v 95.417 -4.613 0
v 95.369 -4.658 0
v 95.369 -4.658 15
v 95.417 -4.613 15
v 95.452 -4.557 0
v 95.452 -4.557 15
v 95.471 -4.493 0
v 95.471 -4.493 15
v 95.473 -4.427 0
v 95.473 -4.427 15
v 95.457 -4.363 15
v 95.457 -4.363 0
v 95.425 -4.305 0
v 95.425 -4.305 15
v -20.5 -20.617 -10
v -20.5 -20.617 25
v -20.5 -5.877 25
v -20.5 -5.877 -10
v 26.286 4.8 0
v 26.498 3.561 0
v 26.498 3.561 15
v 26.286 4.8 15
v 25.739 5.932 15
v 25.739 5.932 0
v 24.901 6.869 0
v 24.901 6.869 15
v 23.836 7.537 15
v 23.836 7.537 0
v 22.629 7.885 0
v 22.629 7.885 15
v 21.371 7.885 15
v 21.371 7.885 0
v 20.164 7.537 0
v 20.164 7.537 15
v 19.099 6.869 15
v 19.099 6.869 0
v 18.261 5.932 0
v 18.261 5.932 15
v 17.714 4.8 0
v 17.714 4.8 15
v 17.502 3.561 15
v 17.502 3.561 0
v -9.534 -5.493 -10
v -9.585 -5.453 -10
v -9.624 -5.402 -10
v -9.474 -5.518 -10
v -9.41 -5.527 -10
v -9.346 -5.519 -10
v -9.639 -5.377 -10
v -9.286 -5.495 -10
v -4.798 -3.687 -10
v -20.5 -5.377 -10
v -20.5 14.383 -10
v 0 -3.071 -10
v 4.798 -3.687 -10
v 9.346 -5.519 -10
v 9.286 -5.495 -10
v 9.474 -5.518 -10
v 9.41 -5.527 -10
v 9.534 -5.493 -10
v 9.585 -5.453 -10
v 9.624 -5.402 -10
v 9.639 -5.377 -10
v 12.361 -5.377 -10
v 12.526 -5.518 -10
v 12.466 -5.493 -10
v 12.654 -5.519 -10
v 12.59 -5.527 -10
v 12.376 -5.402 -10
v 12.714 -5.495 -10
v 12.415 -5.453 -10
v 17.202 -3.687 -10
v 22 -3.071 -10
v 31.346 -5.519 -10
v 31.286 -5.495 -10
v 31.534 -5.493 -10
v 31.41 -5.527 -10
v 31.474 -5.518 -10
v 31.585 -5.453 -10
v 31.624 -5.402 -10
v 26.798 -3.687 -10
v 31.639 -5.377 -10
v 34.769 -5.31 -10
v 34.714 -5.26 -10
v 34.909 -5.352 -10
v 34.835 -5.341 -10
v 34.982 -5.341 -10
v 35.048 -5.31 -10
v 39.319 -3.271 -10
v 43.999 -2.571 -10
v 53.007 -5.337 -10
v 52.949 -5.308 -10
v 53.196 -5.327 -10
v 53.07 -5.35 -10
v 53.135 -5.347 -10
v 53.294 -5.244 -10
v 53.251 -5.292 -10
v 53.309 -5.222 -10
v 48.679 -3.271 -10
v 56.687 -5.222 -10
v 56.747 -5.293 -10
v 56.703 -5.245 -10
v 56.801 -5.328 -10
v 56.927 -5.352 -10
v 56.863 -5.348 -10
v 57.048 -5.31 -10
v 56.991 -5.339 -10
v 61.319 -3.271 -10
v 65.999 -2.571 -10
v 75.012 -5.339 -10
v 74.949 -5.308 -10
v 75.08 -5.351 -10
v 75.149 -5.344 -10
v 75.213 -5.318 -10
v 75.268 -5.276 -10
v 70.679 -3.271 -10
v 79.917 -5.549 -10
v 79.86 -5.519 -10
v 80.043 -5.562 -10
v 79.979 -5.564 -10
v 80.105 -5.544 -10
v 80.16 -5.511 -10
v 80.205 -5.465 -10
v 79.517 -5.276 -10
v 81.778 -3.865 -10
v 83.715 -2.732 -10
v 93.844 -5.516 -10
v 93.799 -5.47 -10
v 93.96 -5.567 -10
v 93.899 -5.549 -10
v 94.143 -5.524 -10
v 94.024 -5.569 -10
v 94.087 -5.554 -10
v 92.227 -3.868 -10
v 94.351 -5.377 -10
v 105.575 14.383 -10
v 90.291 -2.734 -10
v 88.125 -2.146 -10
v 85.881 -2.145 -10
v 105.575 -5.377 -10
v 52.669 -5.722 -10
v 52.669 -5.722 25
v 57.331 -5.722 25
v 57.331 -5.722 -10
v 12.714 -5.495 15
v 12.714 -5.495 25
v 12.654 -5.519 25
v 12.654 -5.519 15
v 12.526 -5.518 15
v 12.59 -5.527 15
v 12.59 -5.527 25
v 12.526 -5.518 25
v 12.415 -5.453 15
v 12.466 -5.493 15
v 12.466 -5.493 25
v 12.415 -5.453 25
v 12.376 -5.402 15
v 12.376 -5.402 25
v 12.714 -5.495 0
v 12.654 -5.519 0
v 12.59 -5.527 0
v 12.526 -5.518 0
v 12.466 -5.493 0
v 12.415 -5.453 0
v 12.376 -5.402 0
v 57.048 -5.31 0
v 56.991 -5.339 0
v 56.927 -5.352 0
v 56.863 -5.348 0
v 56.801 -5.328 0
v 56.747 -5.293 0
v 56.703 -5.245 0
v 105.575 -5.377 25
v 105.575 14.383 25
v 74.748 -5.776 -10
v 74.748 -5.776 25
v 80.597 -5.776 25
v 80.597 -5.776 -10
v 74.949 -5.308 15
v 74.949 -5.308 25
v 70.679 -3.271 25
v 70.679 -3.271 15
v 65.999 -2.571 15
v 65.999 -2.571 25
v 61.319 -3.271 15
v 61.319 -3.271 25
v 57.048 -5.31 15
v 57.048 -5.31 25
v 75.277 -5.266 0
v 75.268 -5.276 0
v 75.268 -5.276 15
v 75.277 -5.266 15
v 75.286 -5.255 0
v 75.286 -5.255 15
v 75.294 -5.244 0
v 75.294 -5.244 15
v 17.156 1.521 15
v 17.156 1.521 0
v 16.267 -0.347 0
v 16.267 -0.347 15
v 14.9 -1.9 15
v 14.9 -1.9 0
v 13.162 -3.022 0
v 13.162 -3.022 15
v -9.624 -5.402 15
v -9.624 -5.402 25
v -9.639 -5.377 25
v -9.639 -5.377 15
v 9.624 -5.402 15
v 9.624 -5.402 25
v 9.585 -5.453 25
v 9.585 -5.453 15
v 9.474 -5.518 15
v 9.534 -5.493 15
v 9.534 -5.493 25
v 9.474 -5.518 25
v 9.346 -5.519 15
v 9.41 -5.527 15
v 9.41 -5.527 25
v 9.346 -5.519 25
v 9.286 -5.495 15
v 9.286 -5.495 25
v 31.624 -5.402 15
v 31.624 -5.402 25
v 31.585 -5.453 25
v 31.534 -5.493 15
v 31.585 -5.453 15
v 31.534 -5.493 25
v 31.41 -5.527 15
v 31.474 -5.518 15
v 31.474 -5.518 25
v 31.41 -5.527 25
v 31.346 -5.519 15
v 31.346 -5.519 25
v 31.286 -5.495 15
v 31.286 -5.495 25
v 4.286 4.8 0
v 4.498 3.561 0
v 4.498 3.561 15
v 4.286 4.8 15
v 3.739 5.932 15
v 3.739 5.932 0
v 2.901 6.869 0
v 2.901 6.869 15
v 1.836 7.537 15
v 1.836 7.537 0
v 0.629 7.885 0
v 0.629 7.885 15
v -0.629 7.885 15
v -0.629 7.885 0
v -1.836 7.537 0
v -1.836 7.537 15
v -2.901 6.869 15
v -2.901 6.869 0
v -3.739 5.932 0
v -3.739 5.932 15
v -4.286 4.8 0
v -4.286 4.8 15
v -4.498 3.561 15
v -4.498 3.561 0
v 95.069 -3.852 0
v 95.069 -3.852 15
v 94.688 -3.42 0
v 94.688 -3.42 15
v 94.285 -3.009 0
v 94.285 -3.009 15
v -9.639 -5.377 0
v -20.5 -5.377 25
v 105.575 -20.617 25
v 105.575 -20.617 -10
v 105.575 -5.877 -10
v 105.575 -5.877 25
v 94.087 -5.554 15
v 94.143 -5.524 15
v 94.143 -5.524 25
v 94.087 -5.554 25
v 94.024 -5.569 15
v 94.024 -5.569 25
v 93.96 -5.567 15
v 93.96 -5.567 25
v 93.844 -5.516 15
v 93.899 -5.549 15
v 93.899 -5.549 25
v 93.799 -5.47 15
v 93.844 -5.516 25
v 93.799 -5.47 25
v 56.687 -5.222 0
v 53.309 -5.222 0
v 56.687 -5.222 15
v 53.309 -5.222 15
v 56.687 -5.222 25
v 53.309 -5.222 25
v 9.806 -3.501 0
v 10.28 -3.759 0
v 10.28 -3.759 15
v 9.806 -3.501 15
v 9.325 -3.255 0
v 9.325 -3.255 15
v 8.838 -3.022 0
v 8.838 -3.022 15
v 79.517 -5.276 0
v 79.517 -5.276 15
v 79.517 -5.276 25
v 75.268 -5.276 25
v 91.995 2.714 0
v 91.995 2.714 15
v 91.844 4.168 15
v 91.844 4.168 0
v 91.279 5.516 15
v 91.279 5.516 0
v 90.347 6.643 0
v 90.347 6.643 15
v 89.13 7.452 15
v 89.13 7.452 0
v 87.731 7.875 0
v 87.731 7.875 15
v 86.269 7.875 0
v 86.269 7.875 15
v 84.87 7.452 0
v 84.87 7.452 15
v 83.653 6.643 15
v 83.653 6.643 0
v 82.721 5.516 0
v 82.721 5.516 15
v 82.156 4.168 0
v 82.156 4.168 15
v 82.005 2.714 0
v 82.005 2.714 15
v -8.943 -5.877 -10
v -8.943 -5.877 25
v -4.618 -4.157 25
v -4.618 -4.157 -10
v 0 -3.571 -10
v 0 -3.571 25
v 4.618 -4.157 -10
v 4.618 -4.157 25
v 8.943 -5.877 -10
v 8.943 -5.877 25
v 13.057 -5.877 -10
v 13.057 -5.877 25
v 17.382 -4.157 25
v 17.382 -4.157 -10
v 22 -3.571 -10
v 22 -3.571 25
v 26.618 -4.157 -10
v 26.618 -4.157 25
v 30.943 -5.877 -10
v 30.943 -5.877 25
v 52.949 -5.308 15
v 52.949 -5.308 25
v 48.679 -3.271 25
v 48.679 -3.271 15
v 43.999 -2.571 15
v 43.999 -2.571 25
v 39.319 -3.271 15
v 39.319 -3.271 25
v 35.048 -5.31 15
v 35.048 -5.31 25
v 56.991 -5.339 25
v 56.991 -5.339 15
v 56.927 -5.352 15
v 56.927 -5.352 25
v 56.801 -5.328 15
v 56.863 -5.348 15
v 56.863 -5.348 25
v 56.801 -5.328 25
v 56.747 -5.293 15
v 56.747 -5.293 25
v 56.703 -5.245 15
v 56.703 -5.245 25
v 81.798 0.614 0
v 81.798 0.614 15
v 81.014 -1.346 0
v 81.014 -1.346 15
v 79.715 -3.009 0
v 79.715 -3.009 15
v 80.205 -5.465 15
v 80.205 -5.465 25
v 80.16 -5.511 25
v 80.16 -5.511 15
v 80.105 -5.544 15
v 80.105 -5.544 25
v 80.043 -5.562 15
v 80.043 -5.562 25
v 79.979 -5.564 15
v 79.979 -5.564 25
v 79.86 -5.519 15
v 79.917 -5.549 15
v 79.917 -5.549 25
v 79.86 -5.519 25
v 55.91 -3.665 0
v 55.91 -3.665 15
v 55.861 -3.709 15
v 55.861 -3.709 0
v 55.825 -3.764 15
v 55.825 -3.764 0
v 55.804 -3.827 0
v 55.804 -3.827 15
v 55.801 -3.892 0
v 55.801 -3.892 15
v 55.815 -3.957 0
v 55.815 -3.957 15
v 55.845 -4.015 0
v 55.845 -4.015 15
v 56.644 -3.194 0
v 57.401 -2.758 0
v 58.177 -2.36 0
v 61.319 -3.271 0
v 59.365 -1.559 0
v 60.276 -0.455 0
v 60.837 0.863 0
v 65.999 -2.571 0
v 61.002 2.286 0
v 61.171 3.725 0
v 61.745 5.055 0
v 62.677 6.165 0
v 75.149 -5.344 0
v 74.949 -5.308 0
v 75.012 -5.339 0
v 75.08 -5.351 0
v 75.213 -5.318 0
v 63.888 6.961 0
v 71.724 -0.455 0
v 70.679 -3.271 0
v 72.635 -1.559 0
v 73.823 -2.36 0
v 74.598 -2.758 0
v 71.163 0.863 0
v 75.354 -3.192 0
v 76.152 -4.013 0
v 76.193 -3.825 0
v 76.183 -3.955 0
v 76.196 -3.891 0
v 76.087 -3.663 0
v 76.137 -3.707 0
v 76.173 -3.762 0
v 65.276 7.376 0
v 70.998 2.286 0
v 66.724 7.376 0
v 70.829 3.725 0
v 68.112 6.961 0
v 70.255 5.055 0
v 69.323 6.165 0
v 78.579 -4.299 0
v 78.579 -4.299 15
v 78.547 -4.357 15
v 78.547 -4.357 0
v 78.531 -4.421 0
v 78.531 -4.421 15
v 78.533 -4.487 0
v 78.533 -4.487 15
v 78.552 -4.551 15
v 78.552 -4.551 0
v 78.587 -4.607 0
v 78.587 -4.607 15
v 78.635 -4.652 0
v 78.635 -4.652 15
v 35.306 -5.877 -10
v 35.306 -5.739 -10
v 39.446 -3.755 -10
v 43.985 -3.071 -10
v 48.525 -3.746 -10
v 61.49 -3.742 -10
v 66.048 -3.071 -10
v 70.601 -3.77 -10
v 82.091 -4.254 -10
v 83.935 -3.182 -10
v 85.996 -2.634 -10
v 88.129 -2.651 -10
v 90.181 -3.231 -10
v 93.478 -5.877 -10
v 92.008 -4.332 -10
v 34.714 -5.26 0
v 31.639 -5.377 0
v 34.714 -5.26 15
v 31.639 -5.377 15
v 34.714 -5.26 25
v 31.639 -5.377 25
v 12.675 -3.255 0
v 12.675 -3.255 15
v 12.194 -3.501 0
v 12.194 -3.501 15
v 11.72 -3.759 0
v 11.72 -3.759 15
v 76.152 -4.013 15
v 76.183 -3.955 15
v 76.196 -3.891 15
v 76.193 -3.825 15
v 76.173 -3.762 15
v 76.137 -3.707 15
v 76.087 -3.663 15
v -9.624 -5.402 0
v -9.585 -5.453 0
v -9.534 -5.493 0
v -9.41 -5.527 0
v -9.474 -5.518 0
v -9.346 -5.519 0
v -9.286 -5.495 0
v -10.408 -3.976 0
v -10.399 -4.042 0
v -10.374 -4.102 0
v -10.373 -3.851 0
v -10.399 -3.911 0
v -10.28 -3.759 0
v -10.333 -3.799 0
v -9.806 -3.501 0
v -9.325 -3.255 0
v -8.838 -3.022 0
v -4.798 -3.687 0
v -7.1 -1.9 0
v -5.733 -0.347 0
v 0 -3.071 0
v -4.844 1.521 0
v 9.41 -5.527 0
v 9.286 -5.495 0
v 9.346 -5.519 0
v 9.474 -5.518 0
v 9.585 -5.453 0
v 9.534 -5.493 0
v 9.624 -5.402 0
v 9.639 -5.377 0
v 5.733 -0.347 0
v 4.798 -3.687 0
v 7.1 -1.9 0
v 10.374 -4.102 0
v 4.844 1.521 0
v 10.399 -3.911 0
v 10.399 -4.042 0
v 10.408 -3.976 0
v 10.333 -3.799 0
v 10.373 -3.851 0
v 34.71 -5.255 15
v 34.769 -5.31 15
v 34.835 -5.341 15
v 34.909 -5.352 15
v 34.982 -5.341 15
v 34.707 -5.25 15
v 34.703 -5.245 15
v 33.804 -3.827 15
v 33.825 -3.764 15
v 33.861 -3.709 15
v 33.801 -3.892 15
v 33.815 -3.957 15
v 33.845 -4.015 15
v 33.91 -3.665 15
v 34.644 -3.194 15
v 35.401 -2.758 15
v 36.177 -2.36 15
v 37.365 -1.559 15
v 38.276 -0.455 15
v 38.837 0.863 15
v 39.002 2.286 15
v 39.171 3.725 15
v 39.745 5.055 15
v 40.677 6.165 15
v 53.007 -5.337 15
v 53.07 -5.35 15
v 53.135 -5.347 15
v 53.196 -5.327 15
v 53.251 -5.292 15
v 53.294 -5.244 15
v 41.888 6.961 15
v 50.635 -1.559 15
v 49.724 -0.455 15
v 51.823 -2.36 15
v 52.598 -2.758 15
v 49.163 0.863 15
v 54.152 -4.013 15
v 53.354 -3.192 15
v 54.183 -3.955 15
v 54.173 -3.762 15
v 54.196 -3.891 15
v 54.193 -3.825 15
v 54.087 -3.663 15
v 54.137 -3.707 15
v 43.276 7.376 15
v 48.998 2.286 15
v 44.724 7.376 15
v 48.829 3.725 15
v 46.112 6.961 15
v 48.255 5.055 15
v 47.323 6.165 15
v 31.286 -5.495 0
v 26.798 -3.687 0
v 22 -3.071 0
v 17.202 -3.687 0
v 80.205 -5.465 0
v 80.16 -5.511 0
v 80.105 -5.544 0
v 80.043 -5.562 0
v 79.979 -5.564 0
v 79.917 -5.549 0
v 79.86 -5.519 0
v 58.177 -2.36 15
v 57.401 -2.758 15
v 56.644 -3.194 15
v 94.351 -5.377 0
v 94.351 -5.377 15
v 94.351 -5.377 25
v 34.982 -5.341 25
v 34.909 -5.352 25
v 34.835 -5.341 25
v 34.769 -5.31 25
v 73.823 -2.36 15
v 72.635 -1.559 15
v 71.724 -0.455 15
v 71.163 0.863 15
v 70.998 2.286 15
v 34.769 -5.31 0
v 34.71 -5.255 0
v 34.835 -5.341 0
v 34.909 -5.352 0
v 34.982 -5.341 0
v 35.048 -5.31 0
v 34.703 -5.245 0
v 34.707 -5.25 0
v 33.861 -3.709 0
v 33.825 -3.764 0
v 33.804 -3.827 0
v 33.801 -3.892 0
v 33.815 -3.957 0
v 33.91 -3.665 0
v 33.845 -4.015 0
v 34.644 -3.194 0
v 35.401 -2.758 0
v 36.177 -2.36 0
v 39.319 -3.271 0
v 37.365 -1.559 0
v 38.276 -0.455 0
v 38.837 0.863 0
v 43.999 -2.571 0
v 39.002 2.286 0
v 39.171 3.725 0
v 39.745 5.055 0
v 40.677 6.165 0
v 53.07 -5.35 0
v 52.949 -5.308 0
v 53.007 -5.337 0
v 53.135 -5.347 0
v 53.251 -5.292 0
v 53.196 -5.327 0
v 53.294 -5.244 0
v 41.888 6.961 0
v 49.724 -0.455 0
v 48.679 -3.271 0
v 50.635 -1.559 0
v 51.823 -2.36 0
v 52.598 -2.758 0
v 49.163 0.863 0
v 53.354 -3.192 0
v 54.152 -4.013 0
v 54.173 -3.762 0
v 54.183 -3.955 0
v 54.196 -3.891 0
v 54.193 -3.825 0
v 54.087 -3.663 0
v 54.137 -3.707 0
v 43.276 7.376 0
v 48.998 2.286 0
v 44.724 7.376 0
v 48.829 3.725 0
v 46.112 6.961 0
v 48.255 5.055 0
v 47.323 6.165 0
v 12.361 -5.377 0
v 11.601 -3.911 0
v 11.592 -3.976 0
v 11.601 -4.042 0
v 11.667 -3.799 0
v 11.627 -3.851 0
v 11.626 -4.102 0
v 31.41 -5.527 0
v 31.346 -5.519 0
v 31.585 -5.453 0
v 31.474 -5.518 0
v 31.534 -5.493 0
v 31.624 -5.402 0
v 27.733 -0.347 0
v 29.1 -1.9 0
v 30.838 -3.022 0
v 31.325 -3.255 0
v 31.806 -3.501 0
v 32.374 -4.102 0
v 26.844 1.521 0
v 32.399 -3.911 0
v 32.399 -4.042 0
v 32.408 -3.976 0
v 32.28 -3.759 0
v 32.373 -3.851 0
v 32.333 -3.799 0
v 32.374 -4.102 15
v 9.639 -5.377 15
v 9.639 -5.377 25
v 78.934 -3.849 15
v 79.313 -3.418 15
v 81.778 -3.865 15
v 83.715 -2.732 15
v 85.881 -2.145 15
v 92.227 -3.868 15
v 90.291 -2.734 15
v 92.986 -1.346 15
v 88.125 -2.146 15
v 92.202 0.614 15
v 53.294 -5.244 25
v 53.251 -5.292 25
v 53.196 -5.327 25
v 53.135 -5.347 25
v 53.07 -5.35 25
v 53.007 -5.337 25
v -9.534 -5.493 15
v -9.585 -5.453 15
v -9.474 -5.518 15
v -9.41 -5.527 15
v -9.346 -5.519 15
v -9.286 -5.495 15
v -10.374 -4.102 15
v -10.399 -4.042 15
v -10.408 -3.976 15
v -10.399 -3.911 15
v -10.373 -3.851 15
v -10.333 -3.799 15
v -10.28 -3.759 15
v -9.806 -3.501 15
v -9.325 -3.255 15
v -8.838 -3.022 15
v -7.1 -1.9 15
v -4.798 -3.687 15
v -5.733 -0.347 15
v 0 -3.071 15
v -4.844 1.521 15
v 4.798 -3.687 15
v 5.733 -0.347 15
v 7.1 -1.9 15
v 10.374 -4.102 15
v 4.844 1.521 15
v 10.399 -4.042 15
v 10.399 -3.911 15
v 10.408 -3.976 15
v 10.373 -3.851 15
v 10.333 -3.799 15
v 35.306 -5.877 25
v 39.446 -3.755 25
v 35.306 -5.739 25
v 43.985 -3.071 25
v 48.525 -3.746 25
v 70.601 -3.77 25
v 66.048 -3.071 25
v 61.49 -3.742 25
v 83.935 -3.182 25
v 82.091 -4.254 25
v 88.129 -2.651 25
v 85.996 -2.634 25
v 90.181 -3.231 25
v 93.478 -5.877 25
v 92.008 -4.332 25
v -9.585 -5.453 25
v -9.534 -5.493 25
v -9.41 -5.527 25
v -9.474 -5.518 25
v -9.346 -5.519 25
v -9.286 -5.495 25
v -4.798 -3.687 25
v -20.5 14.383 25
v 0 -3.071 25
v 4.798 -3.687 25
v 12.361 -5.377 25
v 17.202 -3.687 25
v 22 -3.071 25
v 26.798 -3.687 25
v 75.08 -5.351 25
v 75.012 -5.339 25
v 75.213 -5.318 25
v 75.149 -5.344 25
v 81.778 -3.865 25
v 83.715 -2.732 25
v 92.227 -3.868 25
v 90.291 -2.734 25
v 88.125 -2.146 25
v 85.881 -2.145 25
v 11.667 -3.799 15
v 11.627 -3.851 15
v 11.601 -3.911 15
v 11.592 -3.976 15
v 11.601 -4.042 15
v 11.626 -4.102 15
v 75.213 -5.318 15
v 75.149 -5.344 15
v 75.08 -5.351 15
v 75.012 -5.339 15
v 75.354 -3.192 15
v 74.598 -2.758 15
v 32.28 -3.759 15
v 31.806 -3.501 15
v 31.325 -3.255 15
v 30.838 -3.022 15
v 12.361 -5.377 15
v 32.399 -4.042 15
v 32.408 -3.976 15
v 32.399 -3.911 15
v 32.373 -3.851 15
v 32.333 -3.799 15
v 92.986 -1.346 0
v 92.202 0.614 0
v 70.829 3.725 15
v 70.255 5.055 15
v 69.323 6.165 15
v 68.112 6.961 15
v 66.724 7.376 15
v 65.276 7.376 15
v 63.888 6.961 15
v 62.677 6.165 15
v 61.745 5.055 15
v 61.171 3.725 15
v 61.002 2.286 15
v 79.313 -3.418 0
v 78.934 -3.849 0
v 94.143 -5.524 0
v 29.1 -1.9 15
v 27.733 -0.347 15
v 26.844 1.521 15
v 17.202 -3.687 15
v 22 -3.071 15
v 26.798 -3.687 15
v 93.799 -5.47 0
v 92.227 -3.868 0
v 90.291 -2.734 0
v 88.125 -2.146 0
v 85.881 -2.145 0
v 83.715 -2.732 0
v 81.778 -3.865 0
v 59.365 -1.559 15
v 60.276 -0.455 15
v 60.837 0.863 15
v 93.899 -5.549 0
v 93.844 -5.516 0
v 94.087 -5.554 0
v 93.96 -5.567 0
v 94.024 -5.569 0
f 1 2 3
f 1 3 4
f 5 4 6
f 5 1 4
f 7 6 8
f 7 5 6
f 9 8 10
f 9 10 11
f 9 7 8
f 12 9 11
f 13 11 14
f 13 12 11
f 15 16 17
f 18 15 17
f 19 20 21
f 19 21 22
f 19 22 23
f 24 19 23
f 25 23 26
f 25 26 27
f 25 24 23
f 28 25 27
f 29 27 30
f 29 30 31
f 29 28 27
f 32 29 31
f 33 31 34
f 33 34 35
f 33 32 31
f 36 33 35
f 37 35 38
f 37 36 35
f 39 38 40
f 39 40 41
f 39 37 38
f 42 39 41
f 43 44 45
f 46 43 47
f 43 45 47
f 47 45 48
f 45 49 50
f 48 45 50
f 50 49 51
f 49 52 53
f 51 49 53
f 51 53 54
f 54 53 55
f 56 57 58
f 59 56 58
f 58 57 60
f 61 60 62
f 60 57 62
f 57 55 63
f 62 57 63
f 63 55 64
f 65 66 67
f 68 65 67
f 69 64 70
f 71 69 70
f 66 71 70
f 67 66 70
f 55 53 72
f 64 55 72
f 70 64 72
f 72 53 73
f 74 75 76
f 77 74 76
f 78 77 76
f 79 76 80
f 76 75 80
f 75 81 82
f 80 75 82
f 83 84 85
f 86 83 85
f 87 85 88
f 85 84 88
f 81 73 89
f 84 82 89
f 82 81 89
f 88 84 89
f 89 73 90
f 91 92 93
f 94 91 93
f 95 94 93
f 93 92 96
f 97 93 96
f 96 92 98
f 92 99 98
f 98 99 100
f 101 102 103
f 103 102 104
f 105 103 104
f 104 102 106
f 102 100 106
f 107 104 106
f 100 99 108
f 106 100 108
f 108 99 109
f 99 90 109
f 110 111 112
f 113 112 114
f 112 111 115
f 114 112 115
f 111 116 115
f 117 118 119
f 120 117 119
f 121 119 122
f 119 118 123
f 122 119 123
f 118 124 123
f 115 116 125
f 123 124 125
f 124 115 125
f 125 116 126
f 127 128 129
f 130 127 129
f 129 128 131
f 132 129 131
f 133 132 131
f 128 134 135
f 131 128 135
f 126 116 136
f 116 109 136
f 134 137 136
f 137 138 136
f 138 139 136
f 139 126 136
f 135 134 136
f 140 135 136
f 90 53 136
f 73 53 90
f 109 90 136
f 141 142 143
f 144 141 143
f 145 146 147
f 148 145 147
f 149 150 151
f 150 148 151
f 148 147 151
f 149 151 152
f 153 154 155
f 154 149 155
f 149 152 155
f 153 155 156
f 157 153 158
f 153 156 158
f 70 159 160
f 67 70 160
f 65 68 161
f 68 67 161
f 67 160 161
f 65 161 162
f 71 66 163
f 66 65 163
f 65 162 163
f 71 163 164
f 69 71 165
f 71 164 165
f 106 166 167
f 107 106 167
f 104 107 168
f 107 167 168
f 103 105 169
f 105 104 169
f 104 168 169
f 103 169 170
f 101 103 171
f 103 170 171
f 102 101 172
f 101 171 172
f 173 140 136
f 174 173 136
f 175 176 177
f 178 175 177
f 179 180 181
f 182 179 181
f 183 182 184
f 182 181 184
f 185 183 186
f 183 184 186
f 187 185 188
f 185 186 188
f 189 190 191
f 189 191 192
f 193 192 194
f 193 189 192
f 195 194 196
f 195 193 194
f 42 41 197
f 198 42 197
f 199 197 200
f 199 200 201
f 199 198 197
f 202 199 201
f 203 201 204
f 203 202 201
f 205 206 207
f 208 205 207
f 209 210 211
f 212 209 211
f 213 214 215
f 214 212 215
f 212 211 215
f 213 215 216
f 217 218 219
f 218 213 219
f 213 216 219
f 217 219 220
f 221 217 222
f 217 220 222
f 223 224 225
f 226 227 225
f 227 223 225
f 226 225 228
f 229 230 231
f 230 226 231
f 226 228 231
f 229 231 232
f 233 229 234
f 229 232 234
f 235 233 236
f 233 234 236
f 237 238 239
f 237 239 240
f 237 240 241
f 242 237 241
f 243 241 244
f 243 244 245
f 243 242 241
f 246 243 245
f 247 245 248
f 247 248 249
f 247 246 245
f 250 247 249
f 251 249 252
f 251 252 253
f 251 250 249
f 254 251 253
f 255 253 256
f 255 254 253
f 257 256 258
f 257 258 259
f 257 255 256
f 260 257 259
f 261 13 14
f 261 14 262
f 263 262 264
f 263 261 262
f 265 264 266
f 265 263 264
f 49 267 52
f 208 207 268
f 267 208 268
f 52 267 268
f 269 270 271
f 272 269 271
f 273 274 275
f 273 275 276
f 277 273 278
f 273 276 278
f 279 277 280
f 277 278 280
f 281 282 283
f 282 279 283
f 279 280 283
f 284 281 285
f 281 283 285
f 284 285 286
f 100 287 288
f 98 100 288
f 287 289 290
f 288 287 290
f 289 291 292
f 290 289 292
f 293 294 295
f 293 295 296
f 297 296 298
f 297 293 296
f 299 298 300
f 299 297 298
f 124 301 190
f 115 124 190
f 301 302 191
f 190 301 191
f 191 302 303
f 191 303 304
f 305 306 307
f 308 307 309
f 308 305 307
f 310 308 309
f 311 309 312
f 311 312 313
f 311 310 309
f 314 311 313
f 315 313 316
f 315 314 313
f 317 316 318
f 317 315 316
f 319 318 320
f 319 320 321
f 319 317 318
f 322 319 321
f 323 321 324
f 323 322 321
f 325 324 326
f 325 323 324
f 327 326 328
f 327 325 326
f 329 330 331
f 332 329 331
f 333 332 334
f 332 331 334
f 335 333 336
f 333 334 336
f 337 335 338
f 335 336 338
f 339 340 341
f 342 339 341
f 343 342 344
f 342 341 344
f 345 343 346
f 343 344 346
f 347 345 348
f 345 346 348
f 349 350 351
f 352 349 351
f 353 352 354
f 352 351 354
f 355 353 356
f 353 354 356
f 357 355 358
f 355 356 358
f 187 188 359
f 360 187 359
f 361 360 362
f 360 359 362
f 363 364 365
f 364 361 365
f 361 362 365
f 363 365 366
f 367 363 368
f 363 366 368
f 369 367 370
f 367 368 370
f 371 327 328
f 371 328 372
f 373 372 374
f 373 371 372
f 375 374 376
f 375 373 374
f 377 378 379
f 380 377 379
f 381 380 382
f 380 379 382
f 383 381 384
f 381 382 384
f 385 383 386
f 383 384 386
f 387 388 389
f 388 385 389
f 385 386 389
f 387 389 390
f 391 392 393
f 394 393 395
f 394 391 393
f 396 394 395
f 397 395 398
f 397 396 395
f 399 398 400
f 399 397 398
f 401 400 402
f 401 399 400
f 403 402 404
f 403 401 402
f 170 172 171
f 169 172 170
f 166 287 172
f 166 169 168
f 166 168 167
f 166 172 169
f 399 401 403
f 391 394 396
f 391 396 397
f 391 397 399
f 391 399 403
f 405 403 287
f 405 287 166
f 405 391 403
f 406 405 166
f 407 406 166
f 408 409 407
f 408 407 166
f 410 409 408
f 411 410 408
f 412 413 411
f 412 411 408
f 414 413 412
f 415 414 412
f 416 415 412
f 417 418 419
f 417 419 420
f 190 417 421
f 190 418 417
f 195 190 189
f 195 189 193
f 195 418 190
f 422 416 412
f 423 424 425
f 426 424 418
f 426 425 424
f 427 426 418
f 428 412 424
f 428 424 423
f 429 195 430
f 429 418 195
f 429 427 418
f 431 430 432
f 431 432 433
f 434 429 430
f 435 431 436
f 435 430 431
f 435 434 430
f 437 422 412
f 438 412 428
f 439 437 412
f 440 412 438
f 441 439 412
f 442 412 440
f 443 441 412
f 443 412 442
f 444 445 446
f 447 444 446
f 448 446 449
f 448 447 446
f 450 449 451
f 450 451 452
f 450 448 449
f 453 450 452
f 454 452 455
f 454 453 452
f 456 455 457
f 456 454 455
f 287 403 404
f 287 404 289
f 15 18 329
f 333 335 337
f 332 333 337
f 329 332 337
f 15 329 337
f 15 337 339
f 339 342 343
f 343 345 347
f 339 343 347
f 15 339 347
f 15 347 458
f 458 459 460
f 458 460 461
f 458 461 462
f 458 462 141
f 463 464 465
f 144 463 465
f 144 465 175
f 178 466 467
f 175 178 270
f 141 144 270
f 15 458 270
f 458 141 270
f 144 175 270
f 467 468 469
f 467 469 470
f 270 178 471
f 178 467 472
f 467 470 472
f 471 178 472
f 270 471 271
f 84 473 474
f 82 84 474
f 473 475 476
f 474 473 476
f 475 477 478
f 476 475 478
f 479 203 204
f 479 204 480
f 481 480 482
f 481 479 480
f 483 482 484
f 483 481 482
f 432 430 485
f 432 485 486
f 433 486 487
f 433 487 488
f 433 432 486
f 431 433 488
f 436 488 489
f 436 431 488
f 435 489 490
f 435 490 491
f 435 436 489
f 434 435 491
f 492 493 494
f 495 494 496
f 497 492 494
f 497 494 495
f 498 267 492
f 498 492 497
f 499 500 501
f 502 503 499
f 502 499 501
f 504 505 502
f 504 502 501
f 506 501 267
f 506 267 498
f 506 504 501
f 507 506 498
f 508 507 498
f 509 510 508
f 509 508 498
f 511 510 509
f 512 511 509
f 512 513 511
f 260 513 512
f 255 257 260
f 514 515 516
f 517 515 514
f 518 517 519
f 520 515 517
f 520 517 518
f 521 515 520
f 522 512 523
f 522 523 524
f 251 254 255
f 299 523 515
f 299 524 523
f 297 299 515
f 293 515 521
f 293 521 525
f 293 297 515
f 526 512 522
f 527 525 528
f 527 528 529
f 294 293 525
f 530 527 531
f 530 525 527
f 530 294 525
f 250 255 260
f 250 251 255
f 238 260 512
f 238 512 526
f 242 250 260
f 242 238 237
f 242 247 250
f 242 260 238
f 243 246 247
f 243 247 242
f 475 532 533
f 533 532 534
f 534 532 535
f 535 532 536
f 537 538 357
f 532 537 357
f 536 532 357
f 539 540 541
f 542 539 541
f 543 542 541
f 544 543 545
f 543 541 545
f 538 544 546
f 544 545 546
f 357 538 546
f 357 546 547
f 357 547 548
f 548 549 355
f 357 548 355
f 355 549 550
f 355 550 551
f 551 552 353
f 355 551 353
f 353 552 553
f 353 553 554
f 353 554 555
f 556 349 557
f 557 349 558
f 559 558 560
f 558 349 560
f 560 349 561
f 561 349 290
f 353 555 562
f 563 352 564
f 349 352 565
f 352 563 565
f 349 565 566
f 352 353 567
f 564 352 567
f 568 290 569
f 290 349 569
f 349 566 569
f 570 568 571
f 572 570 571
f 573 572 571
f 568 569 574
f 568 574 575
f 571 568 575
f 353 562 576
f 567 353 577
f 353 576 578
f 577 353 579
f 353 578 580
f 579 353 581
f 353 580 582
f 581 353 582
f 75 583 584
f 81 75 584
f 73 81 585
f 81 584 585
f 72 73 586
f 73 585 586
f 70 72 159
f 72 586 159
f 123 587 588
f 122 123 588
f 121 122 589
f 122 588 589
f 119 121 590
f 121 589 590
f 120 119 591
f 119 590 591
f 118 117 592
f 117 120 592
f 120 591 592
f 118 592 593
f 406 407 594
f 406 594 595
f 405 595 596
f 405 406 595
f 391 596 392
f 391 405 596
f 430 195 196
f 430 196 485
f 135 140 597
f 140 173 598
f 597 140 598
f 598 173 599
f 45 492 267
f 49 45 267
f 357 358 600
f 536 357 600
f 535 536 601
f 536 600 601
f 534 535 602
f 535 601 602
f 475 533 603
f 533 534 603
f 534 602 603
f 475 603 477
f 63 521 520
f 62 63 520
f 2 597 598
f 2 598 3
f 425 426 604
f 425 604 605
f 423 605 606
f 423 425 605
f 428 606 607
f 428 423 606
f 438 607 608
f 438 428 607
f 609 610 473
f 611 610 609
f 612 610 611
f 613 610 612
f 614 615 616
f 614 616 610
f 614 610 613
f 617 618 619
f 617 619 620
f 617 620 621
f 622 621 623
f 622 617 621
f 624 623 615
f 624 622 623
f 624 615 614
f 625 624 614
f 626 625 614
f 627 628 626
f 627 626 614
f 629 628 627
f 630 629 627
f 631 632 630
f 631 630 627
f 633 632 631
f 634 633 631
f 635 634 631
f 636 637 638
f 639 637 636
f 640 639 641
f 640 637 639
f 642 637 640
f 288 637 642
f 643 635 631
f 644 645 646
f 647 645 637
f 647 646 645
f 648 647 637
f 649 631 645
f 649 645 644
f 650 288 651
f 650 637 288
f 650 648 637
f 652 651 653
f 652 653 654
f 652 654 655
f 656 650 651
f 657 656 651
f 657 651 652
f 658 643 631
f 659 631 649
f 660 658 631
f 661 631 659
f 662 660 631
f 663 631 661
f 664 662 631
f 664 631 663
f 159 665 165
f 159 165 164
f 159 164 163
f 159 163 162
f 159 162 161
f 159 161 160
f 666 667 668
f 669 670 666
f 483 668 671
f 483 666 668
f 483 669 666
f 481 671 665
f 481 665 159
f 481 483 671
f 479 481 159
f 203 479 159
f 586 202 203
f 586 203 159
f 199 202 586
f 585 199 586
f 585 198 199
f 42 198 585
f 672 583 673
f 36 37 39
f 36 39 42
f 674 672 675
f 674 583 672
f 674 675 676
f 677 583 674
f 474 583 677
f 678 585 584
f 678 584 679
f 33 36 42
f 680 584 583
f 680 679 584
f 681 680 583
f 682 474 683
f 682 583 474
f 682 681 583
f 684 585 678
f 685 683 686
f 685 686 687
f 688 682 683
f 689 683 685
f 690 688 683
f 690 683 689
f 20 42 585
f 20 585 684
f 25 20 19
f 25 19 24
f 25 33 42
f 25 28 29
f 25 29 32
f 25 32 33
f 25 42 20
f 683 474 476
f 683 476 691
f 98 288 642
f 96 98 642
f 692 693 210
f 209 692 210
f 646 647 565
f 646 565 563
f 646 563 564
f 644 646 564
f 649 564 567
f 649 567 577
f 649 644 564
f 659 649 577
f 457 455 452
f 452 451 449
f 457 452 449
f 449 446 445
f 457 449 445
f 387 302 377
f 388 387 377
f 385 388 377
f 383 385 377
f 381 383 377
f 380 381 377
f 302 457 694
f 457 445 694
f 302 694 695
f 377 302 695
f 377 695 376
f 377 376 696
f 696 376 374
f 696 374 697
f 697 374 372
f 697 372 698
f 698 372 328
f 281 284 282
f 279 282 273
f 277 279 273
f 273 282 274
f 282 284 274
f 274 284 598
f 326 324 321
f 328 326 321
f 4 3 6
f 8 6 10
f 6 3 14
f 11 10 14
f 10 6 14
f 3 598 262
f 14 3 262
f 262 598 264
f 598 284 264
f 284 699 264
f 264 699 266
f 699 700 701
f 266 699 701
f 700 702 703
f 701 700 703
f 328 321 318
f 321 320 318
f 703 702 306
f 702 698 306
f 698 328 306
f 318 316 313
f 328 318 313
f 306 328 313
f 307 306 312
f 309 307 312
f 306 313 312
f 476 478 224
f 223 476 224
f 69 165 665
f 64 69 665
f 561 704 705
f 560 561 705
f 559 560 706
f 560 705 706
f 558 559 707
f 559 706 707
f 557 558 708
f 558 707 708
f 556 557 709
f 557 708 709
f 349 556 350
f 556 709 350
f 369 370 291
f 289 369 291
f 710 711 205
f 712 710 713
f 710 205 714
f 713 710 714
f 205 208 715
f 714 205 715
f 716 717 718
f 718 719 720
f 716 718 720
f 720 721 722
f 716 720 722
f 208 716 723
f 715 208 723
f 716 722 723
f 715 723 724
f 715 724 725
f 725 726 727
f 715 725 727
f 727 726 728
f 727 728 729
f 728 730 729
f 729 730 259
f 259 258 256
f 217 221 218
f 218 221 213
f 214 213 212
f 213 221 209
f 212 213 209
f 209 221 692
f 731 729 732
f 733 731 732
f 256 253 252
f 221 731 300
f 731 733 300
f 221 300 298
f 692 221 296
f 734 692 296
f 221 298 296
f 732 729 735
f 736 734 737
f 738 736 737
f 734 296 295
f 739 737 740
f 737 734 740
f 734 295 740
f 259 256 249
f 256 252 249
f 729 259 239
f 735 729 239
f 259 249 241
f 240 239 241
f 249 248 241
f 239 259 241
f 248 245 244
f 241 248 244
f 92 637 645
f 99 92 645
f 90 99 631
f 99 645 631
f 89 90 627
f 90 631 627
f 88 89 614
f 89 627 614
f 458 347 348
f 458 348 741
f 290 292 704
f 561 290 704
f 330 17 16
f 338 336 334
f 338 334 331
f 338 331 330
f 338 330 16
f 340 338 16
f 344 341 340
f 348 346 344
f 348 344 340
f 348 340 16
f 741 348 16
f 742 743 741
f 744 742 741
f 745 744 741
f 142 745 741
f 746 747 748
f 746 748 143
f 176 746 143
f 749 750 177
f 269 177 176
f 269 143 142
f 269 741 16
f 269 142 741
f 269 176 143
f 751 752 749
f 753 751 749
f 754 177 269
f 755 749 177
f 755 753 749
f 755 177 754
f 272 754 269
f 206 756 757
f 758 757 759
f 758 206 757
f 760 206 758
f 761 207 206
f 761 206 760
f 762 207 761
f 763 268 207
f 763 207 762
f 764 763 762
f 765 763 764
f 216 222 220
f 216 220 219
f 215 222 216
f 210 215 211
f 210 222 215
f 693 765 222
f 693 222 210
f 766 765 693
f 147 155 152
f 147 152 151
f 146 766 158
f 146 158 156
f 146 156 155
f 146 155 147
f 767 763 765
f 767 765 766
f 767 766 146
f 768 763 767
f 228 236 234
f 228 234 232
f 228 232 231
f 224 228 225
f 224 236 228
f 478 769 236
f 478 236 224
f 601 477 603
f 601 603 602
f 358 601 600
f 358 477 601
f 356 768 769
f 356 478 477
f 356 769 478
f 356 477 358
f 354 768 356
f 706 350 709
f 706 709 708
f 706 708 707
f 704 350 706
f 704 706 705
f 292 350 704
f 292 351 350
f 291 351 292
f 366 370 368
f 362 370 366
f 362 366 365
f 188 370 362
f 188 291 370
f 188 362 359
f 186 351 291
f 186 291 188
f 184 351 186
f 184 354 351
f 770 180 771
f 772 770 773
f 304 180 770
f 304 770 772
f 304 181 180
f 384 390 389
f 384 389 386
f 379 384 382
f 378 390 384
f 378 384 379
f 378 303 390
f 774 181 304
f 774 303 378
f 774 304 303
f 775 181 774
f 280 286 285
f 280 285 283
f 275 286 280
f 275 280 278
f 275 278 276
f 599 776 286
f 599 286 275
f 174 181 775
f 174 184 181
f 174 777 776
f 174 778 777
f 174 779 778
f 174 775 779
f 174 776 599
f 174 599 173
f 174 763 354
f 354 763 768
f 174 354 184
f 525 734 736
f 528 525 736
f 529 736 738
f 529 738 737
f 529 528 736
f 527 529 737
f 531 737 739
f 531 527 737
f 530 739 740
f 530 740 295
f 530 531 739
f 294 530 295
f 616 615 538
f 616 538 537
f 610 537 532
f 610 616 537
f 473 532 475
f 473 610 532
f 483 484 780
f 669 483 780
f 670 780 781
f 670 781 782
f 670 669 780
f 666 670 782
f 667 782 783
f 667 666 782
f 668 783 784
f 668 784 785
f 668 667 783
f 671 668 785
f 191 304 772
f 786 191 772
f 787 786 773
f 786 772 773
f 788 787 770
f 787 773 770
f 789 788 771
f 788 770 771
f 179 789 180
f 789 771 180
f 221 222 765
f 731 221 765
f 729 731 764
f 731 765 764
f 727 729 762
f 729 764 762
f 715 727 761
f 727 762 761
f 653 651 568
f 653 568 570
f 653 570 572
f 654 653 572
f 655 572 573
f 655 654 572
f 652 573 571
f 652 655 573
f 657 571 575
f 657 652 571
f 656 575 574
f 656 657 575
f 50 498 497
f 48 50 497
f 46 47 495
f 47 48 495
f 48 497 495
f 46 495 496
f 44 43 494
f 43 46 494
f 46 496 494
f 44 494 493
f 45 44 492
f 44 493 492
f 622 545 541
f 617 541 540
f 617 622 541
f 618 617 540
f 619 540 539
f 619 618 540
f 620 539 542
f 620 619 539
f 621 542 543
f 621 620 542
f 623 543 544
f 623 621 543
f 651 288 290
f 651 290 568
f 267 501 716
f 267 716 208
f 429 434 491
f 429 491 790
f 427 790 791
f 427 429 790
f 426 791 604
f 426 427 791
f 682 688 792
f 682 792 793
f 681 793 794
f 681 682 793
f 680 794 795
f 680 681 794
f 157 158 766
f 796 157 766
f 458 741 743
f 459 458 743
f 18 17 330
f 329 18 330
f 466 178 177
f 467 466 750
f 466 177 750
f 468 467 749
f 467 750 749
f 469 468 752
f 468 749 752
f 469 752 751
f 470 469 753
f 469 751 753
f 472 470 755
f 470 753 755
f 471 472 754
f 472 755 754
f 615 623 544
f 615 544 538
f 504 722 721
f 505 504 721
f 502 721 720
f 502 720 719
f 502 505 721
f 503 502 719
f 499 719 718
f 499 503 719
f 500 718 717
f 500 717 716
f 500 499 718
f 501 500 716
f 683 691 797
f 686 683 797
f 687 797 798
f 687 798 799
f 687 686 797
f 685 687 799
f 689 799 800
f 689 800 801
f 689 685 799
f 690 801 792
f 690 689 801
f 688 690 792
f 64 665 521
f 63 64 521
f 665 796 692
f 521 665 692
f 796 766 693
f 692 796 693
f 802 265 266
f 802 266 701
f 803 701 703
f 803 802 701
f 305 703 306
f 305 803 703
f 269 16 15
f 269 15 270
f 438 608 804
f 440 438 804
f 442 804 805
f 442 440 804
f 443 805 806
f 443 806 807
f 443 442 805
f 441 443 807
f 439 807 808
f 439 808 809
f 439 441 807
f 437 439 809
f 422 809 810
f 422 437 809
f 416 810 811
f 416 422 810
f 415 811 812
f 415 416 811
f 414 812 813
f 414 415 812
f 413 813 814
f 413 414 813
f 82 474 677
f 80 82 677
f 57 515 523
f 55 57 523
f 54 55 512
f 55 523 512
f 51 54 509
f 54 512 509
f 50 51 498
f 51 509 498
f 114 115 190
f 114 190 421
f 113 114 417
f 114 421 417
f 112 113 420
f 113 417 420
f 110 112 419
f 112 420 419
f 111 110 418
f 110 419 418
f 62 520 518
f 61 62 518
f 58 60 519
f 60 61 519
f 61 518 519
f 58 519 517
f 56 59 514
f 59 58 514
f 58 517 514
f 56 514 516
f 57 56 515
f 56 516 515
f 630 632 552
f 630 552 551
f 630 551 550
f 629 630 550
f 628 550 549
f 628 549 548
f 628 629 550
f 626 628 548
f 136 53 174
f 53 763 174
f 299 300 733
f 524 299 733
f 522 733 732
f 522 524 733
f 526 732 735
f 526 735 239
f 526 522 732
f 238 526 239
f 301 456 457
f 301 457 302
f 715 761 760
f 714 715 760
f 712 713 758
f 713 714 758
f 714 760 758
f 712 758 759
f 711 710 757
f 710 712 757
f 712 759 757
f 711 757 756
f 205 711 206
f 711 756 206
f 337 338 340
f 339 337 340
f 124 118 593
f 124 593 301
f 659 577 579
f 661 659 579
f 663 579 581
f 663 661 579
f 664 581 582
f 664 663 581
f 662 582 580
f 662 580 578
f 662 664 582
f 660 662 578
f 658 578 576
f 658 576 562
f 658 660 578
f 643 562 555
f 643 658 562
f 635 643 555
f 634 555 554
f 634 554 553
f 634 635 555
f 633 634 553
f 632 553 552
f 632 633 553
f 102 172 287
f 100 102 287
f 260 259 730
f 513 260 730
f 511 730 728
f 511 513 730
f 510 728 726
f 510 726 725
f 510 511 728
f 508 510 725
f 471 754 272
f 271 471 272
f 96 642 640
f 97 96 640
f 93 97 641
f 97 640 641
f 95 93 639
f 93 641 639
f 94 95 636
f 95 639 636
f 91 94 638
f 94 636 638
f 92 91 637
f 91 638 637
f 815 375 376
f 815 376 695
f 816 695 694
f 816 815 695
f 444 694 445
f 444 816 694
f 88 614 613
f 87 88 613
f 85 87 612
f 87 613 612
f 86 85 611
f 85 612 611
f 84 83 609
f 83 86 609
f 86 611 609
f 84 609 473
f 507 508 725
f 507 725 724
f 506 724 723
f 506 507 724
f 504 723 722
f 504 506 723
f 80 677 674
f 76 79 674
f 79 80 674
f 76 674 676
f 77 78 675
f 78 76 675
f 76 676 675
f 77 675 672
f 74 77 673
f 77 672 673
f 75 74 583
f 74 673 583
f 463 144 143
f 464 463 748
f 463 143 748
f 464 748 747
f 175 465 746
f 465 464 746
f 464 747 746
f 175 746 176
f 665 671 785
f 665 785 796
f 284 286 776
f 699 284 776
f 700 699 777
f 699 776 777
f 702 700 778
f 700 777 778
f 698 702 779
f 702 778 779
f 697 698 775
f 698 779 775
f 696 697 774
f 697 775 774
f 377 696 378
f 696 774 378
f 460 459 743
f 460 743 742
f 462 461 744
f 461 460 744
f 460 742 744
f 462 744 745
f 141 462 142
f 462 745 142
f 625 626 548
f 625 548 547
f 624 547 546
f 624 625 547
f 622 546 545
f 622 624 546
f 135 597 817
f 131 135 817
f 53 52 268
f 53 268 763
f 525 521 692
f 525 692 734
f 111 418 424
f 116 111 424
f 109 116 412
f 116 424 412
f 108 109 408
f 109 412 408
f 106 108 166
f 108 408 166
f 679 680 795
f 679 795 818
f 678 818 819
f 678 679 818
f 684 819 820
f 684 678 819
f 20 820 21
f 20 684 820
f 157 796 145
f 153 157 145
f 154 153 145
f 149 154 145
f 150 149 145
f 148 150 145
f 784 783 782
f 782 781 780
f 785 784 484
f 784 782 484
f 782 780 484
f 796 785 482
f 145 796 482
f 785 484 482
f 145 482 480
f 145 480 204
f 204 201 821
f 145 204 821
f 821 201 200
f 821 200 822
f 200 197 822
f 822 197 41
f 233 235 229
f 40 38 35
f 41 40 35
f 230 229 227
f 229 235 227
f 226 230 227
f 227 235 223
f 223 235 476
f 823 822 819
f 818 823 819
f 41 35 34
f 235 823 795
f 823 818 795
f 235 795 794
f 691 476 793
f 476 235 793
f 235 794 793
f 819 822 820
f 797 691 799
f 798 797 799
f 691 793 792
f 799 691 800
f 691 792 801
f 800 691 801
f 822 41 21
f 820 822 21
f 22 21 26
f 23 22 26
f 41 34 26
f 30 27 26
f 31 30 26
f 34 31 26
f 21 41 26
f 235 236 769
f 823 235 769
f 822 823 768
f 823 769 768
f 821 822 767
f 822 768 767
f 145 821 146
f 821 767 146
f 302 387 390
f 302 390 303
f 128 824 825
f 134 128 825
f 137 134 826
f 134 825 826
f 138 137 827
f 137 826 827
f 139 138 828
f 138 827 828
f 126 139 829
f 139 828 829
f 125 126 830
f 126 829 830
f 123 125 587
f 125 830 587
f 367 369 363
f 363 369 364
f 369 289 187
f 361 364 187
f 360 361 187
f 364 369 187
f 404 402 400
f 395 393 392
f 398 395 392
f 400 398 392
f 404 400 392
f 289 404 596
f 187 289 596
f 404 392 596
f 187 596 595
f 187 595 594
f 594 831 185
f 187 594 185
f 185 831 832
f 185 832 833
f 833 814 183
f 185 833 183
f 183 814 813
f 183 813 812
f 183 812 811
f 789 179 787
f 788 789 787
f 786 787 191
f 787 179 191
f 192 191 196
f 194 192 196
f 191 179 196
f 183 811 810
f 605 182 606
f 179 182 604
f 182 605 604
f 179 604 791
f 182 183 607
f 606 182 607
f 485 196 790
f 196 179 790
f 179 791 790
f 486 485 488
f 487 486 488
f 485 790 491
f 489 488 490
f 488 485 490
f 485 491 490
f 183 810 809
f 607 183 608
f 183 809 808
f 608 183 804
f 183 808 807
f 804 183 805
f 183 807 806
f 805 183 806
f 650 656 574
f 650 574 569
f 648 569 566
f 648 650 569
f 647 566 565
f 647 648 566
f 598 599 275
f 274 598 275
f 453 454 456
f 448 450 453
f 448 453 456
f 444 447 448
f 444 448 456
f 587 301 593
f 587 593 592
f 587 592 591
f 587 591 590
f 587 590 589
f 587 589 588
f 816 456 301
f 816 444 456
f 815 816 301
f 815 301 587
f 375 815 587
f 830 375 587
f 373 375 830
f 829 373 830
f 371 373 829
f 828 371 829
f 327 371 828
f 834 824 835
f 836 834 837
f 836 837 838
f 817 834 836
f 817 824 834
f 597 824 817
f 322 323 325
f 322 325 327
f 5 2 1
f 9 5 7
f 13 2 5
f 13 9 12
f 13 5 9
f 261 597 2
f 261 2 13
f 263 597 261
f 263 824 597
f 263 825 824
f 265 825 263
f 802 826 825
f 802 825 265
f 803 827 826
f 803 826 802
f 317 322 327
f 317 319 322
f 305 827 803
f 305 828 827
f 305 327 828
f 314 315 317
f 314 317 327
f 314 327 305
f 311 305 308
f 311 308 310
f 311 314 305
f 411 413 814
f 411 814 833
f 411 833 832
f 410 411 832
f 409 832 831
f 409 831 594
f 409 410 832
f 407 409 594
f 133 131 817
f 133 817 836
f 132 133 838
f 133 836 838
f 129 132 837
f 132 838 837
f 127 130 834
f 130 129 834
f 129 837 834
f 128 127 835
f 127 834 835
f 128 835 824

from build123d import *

# Parameters (mm, degrees)
F1_W     = 126.075398
F1_H     = 35
F2_DEPTH = 25
F3_DEPTH = 10
F4_DEPTH = 15
F5_DEPTH = 30


with BuildPart() as f2:
    # F1 (on Top) → F2 (new body)
    with BuildSketch(Plane.XY):
        with Locations((42.537699, -3.116712)):
            Rectangle(F1_W, F1_H)
    extrude(amount=F2_DEPTH)

    # F1 (on Top) → F3 (join)
    with BuildSketch(Plane.XY):
        with Locations((42.537699, -3.116712)):
            Rectangle(F1_W, F1_H)
    extrude(amount=-F3_DEPTH)

    # F0 (on Top) → F4 (cut)
    with BuildSketch(Plane.XY):
        with BuildLine():
            ThreePointArc((9.624188, -5.401612), (9.473953, -5.517668), (9.285504, -5.494723))
            ThreePointArc((9.285504, -5.494723), (0, -3.071195), (-9.285504, -5.494723))
            ThreePointArc((-9.285504, -5.494723), (-9.473953, -5.517668), (-9.624188, -5.401612))
            Line((-9.624188, -5.401612), (-9.638627, -5.376602))
            Line((-9.638627, -5.376602), (-31.341475, -5.376602))
            Line((-31.341475, -5.376602), (-31.341475, -5.876602))
            Line((-31.341475, -5.876602), (-8.943443, -5.876602))
            ThreePointArc((-8.943443, -5.876602), (0, -3.571195), (8.943443, -5.876602))
            Line((8.943443, -5.876602), (13.056557, -5.876602))
            ThreePointArc((13.056557, -5.876602), (22, -3.571195), (30.943443, -5.876602))
            Line((30.943443, -5.876602), (35.305954, -5.876602))
            Line((35.305954, -5.876602), (35.305954, -5.739065))
            ThreePointArc((35.305954, -5.739065), (43.984803, -3.071202), (52.668867, -5.722042))
            Line((52.668867, -5.722042), (57.331133, -5.722042))
            ThreePointArc((57.331133, -5.722042), (66.047789, -3.071269), (74.747935, -5.775741))
            Line((74.747935, -5.775741), (80.596593, -5.775741))
            ThreePointArc((80.596593, -5.775741), (87.063122, -2.571444), (93.478282, -5.877384))
            Line((93.478282, -5.877384), (106.779136, -5.877384))
            Line((106.779136, -5.877384), (106.779136, -5.377384))
            Line((106.779136, -5.377384), (94.350775, -5.377384))
            Line((94.350775, -5.377384), (94.143248, -5.524016))
            ThreePointArc((94.143248, -5.524016), (93.960144, -5.566804), (93.799013, -5.469879))
            ThreePointArc((93.799013, -5.469879), (87.003022, -2.071195), (80.204617, -5.465045))
            ThreePointArc((80.204617, -5.465045), (80.043417, -5.561856), (79.860343, -5.518938))
            Line((79.860343, -5.518938), (79.516667, -5.275741))
            Line((79.516667, -5.275741), (75.267808, -5.275741))
            ThreePointArc((75.267808, -5.275741), (75.114422, -5.349584), (74.949319, -5.3081))
            ThreePointArc((74.949319, -5.3081), (65.998621, -2.571195), (57.048395, -5.309642))
            ThreePointArc((57.048395, -5.309642), (56.862797, -5.348213), (56.703491, -5.245471))
            Line((56.703491, -5.245471), (56.687146, -5.222042))
            Line((56.687146, -5.222042), (53.309434, -5.222042))
            Line((53.309434, -5.222042), (53.294212, -5.243869))
            ThreePointArc((53.294212, -5.243869), (53.134924, -5.346638), (52.949319, -5.3081))
            ThreePointArc((52.949319, -5.3081), (43.998621, -2.571195), (35.048395, -5.309642))
            ThreePointArc((35.048395, -5.309642), (34.871524, -5.349677), (34.714123, -5.259616))
            Line((34.714123, -5.259616), (31.638627, -5.376602))
            Line((31.638627, -5.376602), (31.624188, -5.401612))
            ThreePointArc((31.624188, -5.401612), (31.473953, -5.517668), (31.285504, -5.494723))
            ThreePointArc((31.285504, -5.494723), (22, -3.071195), (12.714496, -5.494723))
            ThreePointArc((12.714496, -5.494723), (12.526047, -5.517668), (12.375812, -5.401612))
            Line((12.375812, -5.401612), (12.361373, -5.376602))
            Line((12.361373, -5.376602), (9.638627, -5.376602))
            Line((9.638627, -5.376602), (9.624188, -5.401612))
        make_face()
        with BuildLine():
            ThreePointArc((-9.285504, -5.494723), (0, -3.071195), (9.285504, -5.494723))
            ThreePointArc((9.285504, -5.494723), (9.473953, -5.517668), (9.624188, -5.401612))
            Line((9.624188, -5.401612), (9.638627, -5.376602))
            Line((9.638627, -5.376602), (10.374247, -4.102472))
            ThreePointArc((10.374247, -4.102472), (10.398828, -3.911314), (10.280123, -3.759475))
            ThreePointArc((10.280123, -3.759475), (9.566317, -3.376662), (8.83828, -3.021659))
            ThreePointArc((8.83828, -3.021659), (5.7333, -0.346633), (4.498053, 3.561158))
            ThreePointArc((4.498053, 3.561158), (0, 7.928805), (-4.498053, 3.561158))
            ThreePointArc((-4.498053, 3.561158), (-5.7333, -0.346633), (-8.83828, -3.021659))
            ThreePointArc((-8.83828, -3.021659), (-9.566317, -3.376662), (-10.280123, -3.759475))
            ThreePointArc((-10.280123, -3.759475), (-10.398828, -3.911314), (-10.374247, -4.102472))
            Line((-10.374247, -4.102472), (-9.638627, -5.376602))
            Line((-9.638627, -5.376602), (-9.624188, -5.401612))
            ThreePointArc((-9.624188, -5.401612), (-9.473953, -5.517668), (-9.285504, -5.494723))
        make_face()
        with BuildLine():
            Line((11.625753, -4.102472), (12.361373, -5.376602))
            Line((12.361373, -5.376602), (12.375812, -5.401612))
            ThreePointArc((12.375812, -5.401612), (12.526047, -5.517668), (12.714496, -5.494723))
            ThreePointArc((12.714496, -5.494723), (22, -3.071195), (31.285504, -5.494723))
            ThreePointArc((31.285504, -5.494723), (31.473953, -5.517668), (31.624188, -5.401612))
            Line((31.624188, -5.401612), (31.638627, -5.376602))
            Line((31.638627, -5.376602), (32.374247, -4.102472))
            ThreePointArc((32.374247, -4.102472), (32.398828, -3.911314), (32.280123, -3.759475))
            ThreePointArc((32.280123, -3.759475), (31.566317, -3.376662), (30.83828, -3.021659))
            ThreePointArc((30.83828, -3.021659), (27.7333, -0.346633), (26.498053, 3.561158))
            ThreePointArc((26.498053, 3.561158), (22, 7.928805), (17.501947, 3.561158))
            ThreePointArc((17.501947, 3.561158), (16.2667, -0.346633), (13.16172, -3.021659))
            ThreePointArc((13.16172, -3.021659), (12.433683, -3.376662), (11.719877, -3.759475))
            ThreePointArc((11.719877, -3.759475), (11.601172, -3.911314), (11.625753, -4.102472))
        make_face()
        with BuildLine():
            ThreePointArc((34.703491, -5.245471), (34.708682, -5.252637), (34.714123, -5.259616))
            ThreePointArc((34.714123, -5.259616), (34.871524, -5.349677), (35.048395, -5.309642))
            ThreePointArc((35.048395, -5.309642), (43.998621, -2.571195), (52.949319, -5.3081))
            ThreePointArc((52.949319, -5.3081), (53.134924, -5.346638), (53.294212, -5.243869))
            Line((53.294212, -5.243869), (53.309434, -5.222042))
            Line((53.309434, -5.222042), (54.152334, -4.013375))
            ThreePointArc((54.152334, -4.013375), (54.193078, -3.824758), (54.087376, -3.663316))
            ThreePointArc((54.087376, -3.663316), (52.978813, -2.970524), (51.822892, -2.360015))
            ThreePointArc((51.822892, -2.360015), (49.723682, -0.454601), (48.997959, 2.285948))
            ThreePointArc((48.997959, 2.285948), (44, 7.428805), (39.002041, 2.285948))
            ThreePointArc((39.002041, 2.285948), (38.276318, -0.454601), (36.177108, -2.360015))
            ThreePointArc((36.177108, -2.360015), (35.019843, -2.971298), (33.910055, -3.665055))
            ThreePointArc((33.910055, -3.665055), (33.804381, -3.826515), (33.845157, -4.015125))
            Line((33.845157, -4.015125), (34.703491, -5.245471))
        make_face()
        with BuildLine():
            Line((55.845157, -4.015125), (56.687146, -5.222042))
            Line((56.687146, -5.222042), (56.703491, -5.245471))
            ThreePointArc((56.703491, -5.245471), (56.862797, -5.348213), (57.048395, -5.309642))
            ThreePointArc((57.048395, -5.309642), (65.998621, -2.571195), (74.949319, -5.3081))
            ThreePointArc((74.949319, -5.3081), (75.114422, -5.349584), (75.267808, -5.275741))
            ThreePointArc((75.267808, -5.275741), (75.281671, -5.260352), (75.294212, -5.243869))
            Line((75.294212, -5.243869), (76.152334, -4.013375))
            ThreePointArc((76.152334, -4.013375), (76.193078, -3.824758), (76.087376, -3.663316))
            ThreePointArc((76.087376, -3.663316), (74.978813, -2.970524), (73.822892, -2.360015))
            ThreePointArc((73.822892, -2.360015), (71.723682, -0.454601), (70.997959, 2.285948))
            ThreePointArc((70.997959, 2.285948), (66, 7.428805), (61.002041, 2.285948))
            ThreePointArc((61.002041, 2.285948), (60.276318, -0.454601), (58.177108, -2.360015))
            ThreePointArc((58.177108, -2.360015), (57.019843, -2.971298), (55.910055, -3.665055))
            ThreePointArc((55.910055, -3.665055), (55.804381, -3.826515), (55.845157, -4.015125))
        make_face()
        with BuildLine():
            Line((94.143248, -5.524016), (94.350775, -5.377384))
            Line((94.350775, -5.377384), (95.368731, -4.65813))
            ThreePointArc((95.368731, -4.65813), (95.47135, -4.49331), (95.425064, -4.304753))
            ThreePointArc((95.425064, -4.304753), (94.881653, -3.633649), (94.284934, -3.009467))
            ThreePointArc((94.284934, -3.009467), (92.524954, -0.393838), (91.995383, 2.71399))
            ThreePointArc((91.995383, 2.71399), (87, 7.928805), (82.004617, 2.71399))
            ThreePointArc((82.004617, 2.71399), (81.475046, -0.393838), (79.715066, -3.009467))
            ThreePointArc((79.715066, -3.009467), (79.120814, -3.630847), (78.579394, -4.298764))
            ThreePointArc((78.579394, -4.298764), (78.532974, -4.487288), (78.635475, -4.652181))
            Line((78.635475, -4.652181), (79.516667, -5.275741))
            Line((79.516667, -5.275741), (79.860343, -5.518938))
            ThreePointArc((79.860343, -5.518938), (80.043417, -5.561856), (80.204617, -5.465045))
            ThreePointArc((80.204617, -5.465045), (87.003022, -2.071195), (93.799013, -5.469879))
            ThreePointArc((93.799013, -5.469879), (93.960144, -5.566804), (94.143248, -5.524016))
        make_face()
    extrude(amount=F4_DEPTH, mode=Mode.SUBTRACT)

    # F0 (on Top) → F5 (cut, symmetric)
    with BuildSketch(Plane.XY):
        with BuildLine():
            ThreePointArc((9.624188, -5.401612), (9.473953, -5.517668), (9.285504, -5.494723))
            ThreePointArc((9.285504, -5.494723), (0, -3.071195), (-9.285504, -5.494723))
            ThreePointArc((-9.285504, -5.494723), (-9.473953, -5.517668), (-9.624188, -5.401612))
            Line((-9.624188, -5.401612), (-9.638627, -5.376602))
            Line((-9.638627, -5.376602), (-31.341475, -5.376602))
            Line((-31.341475, -5.376602), (-31.341475, -5.876602))
            Line((-31.341475, -5.876602), (-8.943443, -5.876602))
            ThreePointArc((-8.943443, -5.876602), (0, -3.571195), (8.943443, -5.876602))
            Line((8.943443, -5.876602), (13.056557, -5.876602))
            ThreePointArc((13.056557, -5.876602), (22, -3.571195), (30.943443, -5.876602))
            Line((30.943443, -5.876602), (35.305954, -5.876602))
            Line((35.305954, -5.876602), (35.305954, -5.739065))
            ThreePointArc((35.305954, -5.739065), (43.984803, -3.071202), (52.668867, -5.722042))
            Line((52.668867, -5.722042), (57.331133, -5.722042))
            ThreePointArc((57.331133, -5.722042), (66.047789, -3.071269), (74.747935, -5.775741))
            Line((74.747935, -5.775741), (80.596593, -5.775741))
            ThreePointArc((80.596593, -5.775741), (87.063122, -2.571444), (93.478282, -5.877384))
            Line((93.478282, -5.877384), (106.779136, -5.877384))
            Line((106.779136, -5.877384), (106.779136, -5.377384))
            Line((106.779136, -5.377384), (94.350775, -5.377384))
            Line((94.350775, -5.377384), (94.143248, -5.524016))
            ThreePointArc((94.143248, -5.524016), (93.960144, -5.566804), (93.799013, -5.469879))
            ThreePointArc((93.799013, -5.469879), (87.003022, -2.071195), (80.204617, -5.465045))
            ThreePointArc((80.204617, -5.465045), (80.043417, -5.561856), (79.860343, -5.518938))
            Line((79.860343, -5.518938), (79.516667, -5.275741))
            Line((79.516667, -5.275741), (75.267808, -5.275741))
            ThreePointArc((75.267808, -5.275741), (75.114422, -5.349584), (74.949319, -5.3081))
            ThreePointArc((74.949319, -5.3081), (65.998621, -2.571195), (57.048395, -5.309642))
            ThreePointArc((57.048395, -5.309642), (56.862797, -5.348213), (56.703491, -5.245471))
            Line((56.703491, -5.245471), (56.687146, -5.222042))
            Line((56.687146, -5.222042), (53.309434, -5.222042))
            Line((53.309434, -5.222042), (53.294212, -5.243869))
            ThreePointArc((53.294212, -5.243869), (53.134924, -5.346638), (52.949319, -5.3081))
            ThreePointArc((52.949319, -5.3081), (43.998621, -2.571195), (35.048395, -5.309642))
            ThreePointArc((35.048395, -5.309642), (34.871524, -5.349677), (34.714123, -5.259616))
            Line((34.714123, -5.259616), (31.638627, -5.376602))
            Line((31.638627, -5.376602), (31.624188, -5.401612))
            ThreePointArc((31.624188, -5.401612), (31.473953, -5.517668), (31.285504, -5.494723))
            ThreePointArc((31.285504, -5.494723), (22, -3.071195), (12.714496, -5.494723))
            ThreePointArc((12.714496, -5.494723), (12.526047, -5.517668), (12.375812, -5.401612))
            Line((12.375812, -5.401612), (12.361373, -5.376602))
            Line((12.361373, -5.376602), (9.638627, -5.376602))
            Line((9.638627, -5.376602), (9.624188, -5.401612))
        make_face()
    extrude(amount=F5_DEPTH, both=True, mode=Mode.SUBTRACT)


solid = f2.part
